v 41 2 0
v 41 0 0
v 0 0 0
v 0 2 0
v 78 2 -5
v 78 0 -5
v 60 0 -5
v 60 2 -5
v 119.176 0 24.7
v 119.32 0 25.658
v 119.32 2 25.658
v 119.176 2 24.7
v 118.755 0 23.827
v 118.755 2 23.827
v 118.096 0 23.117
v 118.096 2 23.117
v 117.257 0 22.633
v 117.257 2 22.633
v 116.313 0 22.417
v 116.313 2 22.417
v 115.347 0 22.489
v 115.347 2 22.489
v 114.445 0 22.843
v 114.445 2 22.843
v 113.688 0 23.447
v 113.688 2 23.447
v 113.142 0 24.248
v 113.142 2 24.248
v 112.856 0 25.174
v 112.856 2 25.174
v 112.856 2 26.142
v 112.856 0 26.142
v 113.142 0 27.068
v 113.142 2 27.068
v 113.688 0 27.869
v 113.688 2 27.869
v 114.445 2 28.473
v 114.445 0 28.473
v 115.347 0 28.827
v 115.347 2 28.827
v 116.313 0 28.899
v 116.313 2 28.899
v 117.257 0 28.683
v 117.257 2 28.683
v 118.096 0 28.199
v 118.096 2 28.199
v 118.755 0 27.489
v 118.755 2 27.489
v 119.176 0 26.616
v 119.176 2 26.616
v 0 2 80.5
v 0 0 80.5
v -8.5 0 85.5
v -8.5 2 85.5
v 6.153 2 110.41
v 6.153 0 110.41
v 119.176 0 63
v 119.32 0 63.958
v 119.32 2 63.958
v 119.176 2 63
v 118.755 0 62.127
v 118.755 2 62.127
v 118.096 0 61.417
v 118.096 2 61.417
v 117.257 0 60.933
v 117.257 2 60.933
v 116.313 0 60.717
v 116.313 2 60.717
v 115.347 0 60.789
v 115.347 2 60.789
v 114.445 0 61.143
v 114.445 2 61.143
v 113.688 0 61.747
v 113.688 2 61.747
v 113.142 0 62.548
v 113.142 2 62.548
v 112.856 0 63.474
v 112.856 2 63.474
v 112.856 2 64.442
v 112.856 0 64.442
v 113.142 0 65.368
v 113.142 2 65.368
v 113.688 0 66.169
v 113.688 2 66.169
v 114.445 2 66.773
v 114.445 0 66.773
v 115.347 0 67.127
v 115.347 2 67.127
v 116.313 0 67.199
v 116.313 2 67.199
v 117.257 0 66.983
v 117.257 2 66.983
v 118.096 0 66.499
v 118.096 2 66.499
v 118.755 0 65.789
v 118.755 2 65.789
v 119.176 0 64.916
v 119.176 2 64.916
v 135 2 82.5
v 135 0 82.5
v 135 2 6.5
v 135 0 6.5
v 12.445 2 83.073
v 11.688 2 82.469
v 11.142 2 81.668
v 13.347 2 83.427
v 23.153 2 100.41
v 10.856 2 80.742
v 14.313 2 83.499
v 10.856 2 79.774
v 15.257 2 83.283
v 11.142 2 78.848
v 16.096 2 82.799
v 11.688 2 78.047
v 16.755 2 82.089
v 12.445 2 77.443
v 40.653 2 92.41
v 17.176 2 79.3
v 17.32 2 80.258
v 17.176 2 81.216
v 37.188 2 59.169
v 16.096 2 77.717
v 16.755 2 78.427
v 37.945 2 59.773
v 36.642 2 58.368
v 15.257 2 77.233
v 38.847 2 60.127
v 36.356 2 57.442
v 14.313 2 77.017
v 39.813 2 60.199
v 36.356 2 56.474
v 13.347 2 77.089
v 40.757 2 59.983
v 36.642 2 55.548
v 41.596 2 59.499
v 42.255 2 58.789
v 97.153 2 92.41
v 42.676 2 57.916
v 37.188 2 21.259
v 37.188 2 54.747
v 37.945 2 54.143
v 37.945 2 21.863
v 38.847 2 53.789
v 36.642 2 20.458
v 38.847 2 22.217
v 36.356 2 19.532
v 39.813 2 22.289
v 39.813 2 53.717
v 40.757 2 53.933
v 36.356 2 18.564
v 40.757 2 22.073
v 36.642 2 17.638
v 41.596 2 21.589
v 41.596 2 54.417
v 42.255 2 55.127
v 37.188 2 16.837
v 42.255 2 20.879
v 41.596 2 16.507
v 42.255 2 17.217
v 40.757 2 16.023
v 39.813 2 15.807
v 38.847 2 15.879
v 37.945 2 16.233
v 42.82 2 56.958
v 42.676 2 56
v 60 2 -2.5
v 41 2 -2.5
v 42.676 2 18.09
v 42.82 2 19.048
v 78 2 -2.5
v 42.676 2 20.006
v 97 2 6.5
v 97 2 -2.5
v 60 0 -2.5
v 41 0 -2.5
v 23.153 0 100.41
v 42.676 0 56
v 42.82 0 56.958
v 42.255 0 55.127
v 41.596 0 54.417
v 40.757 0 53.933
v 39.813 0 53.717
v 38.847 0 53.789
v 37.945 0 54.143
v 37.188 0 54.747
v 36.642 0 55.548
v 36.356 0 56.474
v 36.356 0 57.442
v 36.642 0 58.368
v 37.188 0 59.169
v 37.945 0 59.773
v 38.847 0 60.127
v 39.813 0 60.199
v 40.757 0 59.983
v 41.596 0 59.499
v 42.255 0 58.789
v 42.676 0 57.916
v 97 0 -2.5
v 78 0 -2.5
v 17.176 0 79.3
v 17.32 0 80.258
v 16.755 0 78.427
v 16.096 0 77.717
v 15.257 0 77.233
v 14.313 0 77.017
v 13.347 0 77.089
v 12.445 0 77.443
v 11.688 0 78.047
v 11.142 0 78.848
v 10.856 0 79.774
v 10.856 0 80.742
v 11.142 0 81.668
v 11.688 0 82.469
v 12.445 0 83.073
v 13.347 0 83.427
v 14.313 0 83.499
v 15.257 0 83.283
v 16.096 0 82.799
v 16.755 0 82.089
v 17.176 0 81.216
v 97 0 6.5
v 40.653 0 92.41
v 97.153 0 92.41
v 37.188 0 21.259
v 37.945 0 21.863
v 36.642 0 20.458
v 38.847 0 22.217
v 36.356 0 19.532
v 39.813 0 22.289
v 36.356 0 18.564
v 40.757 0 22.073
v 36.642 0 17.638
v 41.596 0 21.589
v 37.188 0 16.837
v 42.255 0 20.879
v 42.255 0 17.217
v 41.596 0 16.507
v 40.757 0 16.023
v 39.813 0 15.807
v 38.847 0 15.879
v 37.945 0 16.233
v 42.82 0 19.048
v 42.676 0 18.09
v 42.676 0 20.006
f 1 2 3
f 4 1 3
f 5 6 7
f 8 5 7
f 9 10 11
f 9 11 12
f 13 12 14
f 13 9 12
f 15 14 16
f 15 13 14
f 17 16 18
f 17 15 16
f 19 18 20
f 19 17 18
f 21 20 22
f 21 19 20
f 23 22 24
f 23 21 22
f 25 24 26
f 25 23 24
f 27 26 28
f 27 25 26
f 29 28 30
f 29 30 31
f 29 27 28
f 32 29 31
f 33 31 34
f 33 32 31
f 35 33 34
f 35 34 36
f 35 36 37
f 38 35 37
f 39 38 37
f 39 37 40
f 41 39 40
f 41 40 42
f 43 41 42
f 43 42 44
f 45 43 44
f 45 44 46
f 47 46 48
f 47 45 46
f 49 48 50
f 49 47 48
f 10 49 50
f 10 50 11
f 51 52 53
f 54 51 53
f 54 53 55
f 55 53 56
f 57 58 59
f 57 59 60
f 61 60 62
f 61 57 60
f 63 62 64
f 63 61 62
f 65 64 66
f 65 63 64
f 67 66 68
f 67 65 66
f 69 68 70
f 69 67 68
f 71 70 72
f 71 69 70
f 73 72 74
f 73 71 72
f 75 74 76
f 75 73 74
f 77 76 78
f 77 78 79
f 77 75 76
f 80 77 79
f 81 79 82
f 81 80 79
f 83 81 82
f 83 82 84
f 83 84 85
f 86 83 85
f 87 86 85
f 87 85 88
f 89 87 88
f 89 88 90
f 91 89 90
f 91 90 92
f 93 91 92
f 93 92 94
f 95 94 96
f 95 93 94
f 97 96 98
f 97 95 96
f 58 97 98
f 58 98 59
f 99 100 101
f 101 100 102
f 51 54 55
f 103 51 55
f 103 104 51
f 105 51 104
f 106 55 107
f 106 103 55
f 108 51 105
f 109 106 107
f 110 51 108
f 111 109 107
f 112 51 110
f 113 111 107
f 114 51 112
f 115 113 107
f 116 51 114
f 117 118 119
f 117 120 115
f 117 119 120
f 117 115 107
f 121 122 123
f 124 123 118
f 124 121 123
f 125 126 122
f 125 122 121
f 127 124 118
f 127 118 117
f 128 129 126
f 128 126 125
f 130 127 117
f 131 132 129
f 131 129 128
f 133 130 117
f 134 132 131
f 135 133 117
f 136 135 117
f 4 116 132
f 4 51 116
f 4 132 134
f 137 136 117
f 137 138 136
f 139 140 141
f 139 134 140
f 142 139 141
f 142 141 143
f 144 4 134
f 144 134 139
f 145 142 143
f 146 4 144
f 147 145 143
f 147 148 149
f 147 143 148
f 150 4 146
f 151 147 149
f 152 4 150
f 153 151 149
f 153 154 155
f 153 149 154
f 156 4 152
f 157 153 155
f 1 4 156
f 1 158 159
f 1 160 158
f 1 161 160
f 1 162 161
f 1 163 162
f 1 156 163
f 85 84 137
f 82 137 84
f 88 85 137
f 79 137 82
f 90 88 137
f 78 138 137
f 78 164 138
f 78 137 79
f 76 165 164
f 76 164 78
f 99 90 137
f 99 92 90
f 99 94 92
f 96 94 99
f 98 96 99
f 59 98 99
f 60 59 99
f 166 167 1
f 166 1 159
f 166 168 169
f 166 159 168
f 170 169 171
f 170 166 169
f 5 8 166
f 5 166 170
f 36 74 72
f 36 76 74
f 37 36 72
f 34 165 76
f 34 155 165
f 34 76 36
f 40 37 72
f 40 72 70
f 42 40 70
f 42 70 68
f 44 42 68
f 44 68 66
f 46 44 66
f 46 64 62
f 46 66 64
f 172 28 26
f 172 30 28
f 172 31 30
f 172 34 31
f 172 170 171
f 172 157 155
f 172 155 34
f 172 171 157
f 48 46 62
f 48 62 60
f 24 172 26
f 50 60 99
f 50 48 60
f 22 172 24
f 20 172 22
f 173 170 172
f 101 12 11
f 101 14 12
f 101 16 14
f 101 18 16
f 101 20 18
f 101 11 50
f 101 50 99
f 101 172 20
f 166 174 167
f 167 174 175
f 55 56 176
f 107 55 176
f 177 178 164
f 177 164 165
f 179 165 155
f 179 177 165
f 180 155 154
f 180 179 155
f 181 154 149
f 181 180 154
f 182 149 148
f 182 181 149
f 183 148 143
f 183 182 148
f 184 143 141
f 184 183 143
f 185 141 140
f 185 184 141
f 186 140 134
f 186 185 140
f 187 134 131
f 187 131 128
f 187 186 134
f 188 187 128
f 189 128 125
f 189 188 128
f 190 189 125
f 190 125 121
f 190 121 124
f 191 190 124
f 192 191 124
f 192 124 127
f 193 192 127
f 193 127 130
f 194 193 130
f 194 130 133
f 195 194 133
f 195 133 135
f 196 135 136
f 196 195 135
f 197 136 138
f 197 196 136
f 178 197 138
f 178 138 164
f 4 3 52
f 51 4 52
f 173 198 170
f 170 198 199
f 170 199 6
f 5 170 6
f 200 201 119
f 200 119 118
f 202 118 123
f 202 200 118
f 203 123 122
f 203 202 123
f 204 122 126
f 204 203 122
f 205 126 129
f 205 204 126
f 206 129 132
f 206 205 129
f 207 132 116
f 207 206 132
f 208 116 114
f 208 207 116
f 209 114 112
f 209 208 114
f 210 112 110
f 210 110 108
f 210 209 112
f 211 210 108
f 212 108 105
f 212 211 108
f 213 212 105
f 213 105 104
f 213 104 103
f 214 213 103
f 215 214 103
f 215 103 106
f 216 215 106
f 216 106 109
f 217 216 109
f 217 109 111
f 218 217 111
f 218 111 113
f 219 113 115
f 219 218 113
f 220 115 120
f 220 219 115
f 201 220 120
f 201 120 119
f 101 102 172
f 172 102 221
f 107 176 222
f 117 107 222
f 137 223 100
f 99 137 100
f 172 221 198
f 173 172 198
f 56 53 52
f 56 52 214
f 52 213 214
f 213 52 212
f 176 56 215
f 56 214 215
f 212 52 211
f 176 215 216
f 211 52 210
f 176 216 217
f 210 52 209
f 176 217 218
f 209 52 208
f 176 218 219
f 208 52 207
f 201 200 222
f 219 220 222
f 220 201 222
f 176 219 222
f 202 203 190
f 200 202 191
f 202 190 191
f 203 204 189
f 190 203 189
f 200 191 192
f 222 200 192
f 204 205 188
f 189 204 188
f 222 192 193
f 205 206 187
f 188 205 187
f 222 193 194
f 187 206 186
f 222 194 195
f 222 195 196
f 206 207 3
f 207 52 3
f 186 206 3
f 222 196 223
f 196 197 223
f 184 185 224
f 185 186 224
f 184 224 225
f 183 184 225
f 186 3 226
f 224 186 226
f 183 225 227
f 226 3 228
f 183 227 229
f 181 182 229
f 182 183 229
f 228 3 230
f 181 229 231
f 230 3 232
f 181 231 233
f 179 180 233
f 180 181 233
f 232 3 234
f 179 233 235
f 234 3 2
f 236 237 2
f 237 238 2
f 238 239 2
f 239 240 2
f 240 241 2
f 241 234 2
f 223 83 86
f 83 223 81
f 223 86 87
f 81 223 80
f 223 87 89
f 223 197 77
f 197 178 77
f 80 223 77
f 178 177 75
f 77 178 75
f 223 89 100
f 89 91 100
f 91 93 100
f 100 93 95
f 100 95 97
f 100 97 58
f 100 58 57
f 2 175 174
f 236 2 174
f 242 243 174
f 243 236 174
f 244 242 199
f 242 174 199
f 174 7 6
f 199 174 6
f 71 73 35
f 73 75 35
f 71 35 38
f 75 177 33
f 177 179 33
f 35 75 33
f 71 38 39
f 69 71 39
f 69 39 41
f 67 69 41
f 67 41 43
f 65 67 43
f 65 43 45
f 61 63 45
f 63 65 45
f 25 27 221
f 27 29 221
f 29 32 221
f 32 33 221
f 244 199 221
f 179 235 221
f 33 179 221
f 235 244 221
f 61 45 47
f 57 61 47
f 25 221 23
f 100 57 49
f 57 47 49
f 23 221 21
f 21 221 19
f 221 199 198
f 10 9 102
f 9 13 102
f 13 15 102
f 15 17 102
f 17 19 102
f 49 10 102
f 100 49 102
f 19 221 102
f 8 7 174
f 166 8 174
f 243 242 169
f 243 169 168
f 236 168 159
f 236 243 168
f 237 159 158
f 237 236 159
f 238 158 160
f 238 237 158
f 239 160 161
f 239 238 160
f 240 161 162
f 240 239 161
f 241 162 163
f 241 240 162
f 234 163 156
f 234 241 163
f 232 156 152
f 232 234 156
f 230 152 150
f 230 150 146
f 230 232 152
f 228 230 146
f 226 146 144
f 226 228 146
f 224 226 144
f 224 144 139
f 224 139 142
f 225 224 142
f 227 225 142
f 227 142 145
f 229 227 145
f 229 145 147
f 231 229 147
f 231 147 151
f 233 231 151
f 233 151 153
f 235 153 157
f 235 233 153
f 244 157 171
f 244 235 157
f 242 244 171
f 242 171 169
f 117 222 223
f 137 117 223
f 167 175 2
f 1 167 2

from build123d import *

# Parameters (mm, degrees)
SKETCH_1_R      = 3.25
EXTRUDE_1_DEPTH = 2


with BuildPart() as part:
    # Эскиз1 → Бобышка-Вытянуть1 (new body)
    with BuildSketch(Plane(origin=(0, 0, 0), x_dir=(1, 0, 0), z_dir=(0, 1, 0))):
        Polygon((0, 0), (0, -80.5), (-8.5, -85.5), (6.153232532, -110.410495305), (23.153232532, -100.410495305), (40.653232532, -92.410495305), (97.153232532, -92.410495305), (135, -82.5), (135, -6.5), (97, -6.5), (97, 2.5), (78, 2.5), (78, 5), (60, 5), (60, 2.5), (41, 2.5), (41, 0), align=None)
        with Locations((14.07, -80.258)):
            Circle(SKETCH_1_R, mode=Mode.SUBTRACT)
        with Locations((39.57, -56.958)):
            Circle(SKETCH_1_R, mode=Mode.SUBTRACT)
        with Locations((116.07, -63.958)):
            Circle(SKETCH_1_R, mode=Mode.SUBTRACT)
        with Locations((116.07, -25.658)):
            Circle(SKETCH_1_R, mode=Mode.SUBTRACT)
        with Locations((39.57, -19.048)):
            Circle(SKETCH_1_R, mode=Mode.SUBTRACT)
    extrude(amount=EXTRUDE_1_DEPTH)


solid = part.part
